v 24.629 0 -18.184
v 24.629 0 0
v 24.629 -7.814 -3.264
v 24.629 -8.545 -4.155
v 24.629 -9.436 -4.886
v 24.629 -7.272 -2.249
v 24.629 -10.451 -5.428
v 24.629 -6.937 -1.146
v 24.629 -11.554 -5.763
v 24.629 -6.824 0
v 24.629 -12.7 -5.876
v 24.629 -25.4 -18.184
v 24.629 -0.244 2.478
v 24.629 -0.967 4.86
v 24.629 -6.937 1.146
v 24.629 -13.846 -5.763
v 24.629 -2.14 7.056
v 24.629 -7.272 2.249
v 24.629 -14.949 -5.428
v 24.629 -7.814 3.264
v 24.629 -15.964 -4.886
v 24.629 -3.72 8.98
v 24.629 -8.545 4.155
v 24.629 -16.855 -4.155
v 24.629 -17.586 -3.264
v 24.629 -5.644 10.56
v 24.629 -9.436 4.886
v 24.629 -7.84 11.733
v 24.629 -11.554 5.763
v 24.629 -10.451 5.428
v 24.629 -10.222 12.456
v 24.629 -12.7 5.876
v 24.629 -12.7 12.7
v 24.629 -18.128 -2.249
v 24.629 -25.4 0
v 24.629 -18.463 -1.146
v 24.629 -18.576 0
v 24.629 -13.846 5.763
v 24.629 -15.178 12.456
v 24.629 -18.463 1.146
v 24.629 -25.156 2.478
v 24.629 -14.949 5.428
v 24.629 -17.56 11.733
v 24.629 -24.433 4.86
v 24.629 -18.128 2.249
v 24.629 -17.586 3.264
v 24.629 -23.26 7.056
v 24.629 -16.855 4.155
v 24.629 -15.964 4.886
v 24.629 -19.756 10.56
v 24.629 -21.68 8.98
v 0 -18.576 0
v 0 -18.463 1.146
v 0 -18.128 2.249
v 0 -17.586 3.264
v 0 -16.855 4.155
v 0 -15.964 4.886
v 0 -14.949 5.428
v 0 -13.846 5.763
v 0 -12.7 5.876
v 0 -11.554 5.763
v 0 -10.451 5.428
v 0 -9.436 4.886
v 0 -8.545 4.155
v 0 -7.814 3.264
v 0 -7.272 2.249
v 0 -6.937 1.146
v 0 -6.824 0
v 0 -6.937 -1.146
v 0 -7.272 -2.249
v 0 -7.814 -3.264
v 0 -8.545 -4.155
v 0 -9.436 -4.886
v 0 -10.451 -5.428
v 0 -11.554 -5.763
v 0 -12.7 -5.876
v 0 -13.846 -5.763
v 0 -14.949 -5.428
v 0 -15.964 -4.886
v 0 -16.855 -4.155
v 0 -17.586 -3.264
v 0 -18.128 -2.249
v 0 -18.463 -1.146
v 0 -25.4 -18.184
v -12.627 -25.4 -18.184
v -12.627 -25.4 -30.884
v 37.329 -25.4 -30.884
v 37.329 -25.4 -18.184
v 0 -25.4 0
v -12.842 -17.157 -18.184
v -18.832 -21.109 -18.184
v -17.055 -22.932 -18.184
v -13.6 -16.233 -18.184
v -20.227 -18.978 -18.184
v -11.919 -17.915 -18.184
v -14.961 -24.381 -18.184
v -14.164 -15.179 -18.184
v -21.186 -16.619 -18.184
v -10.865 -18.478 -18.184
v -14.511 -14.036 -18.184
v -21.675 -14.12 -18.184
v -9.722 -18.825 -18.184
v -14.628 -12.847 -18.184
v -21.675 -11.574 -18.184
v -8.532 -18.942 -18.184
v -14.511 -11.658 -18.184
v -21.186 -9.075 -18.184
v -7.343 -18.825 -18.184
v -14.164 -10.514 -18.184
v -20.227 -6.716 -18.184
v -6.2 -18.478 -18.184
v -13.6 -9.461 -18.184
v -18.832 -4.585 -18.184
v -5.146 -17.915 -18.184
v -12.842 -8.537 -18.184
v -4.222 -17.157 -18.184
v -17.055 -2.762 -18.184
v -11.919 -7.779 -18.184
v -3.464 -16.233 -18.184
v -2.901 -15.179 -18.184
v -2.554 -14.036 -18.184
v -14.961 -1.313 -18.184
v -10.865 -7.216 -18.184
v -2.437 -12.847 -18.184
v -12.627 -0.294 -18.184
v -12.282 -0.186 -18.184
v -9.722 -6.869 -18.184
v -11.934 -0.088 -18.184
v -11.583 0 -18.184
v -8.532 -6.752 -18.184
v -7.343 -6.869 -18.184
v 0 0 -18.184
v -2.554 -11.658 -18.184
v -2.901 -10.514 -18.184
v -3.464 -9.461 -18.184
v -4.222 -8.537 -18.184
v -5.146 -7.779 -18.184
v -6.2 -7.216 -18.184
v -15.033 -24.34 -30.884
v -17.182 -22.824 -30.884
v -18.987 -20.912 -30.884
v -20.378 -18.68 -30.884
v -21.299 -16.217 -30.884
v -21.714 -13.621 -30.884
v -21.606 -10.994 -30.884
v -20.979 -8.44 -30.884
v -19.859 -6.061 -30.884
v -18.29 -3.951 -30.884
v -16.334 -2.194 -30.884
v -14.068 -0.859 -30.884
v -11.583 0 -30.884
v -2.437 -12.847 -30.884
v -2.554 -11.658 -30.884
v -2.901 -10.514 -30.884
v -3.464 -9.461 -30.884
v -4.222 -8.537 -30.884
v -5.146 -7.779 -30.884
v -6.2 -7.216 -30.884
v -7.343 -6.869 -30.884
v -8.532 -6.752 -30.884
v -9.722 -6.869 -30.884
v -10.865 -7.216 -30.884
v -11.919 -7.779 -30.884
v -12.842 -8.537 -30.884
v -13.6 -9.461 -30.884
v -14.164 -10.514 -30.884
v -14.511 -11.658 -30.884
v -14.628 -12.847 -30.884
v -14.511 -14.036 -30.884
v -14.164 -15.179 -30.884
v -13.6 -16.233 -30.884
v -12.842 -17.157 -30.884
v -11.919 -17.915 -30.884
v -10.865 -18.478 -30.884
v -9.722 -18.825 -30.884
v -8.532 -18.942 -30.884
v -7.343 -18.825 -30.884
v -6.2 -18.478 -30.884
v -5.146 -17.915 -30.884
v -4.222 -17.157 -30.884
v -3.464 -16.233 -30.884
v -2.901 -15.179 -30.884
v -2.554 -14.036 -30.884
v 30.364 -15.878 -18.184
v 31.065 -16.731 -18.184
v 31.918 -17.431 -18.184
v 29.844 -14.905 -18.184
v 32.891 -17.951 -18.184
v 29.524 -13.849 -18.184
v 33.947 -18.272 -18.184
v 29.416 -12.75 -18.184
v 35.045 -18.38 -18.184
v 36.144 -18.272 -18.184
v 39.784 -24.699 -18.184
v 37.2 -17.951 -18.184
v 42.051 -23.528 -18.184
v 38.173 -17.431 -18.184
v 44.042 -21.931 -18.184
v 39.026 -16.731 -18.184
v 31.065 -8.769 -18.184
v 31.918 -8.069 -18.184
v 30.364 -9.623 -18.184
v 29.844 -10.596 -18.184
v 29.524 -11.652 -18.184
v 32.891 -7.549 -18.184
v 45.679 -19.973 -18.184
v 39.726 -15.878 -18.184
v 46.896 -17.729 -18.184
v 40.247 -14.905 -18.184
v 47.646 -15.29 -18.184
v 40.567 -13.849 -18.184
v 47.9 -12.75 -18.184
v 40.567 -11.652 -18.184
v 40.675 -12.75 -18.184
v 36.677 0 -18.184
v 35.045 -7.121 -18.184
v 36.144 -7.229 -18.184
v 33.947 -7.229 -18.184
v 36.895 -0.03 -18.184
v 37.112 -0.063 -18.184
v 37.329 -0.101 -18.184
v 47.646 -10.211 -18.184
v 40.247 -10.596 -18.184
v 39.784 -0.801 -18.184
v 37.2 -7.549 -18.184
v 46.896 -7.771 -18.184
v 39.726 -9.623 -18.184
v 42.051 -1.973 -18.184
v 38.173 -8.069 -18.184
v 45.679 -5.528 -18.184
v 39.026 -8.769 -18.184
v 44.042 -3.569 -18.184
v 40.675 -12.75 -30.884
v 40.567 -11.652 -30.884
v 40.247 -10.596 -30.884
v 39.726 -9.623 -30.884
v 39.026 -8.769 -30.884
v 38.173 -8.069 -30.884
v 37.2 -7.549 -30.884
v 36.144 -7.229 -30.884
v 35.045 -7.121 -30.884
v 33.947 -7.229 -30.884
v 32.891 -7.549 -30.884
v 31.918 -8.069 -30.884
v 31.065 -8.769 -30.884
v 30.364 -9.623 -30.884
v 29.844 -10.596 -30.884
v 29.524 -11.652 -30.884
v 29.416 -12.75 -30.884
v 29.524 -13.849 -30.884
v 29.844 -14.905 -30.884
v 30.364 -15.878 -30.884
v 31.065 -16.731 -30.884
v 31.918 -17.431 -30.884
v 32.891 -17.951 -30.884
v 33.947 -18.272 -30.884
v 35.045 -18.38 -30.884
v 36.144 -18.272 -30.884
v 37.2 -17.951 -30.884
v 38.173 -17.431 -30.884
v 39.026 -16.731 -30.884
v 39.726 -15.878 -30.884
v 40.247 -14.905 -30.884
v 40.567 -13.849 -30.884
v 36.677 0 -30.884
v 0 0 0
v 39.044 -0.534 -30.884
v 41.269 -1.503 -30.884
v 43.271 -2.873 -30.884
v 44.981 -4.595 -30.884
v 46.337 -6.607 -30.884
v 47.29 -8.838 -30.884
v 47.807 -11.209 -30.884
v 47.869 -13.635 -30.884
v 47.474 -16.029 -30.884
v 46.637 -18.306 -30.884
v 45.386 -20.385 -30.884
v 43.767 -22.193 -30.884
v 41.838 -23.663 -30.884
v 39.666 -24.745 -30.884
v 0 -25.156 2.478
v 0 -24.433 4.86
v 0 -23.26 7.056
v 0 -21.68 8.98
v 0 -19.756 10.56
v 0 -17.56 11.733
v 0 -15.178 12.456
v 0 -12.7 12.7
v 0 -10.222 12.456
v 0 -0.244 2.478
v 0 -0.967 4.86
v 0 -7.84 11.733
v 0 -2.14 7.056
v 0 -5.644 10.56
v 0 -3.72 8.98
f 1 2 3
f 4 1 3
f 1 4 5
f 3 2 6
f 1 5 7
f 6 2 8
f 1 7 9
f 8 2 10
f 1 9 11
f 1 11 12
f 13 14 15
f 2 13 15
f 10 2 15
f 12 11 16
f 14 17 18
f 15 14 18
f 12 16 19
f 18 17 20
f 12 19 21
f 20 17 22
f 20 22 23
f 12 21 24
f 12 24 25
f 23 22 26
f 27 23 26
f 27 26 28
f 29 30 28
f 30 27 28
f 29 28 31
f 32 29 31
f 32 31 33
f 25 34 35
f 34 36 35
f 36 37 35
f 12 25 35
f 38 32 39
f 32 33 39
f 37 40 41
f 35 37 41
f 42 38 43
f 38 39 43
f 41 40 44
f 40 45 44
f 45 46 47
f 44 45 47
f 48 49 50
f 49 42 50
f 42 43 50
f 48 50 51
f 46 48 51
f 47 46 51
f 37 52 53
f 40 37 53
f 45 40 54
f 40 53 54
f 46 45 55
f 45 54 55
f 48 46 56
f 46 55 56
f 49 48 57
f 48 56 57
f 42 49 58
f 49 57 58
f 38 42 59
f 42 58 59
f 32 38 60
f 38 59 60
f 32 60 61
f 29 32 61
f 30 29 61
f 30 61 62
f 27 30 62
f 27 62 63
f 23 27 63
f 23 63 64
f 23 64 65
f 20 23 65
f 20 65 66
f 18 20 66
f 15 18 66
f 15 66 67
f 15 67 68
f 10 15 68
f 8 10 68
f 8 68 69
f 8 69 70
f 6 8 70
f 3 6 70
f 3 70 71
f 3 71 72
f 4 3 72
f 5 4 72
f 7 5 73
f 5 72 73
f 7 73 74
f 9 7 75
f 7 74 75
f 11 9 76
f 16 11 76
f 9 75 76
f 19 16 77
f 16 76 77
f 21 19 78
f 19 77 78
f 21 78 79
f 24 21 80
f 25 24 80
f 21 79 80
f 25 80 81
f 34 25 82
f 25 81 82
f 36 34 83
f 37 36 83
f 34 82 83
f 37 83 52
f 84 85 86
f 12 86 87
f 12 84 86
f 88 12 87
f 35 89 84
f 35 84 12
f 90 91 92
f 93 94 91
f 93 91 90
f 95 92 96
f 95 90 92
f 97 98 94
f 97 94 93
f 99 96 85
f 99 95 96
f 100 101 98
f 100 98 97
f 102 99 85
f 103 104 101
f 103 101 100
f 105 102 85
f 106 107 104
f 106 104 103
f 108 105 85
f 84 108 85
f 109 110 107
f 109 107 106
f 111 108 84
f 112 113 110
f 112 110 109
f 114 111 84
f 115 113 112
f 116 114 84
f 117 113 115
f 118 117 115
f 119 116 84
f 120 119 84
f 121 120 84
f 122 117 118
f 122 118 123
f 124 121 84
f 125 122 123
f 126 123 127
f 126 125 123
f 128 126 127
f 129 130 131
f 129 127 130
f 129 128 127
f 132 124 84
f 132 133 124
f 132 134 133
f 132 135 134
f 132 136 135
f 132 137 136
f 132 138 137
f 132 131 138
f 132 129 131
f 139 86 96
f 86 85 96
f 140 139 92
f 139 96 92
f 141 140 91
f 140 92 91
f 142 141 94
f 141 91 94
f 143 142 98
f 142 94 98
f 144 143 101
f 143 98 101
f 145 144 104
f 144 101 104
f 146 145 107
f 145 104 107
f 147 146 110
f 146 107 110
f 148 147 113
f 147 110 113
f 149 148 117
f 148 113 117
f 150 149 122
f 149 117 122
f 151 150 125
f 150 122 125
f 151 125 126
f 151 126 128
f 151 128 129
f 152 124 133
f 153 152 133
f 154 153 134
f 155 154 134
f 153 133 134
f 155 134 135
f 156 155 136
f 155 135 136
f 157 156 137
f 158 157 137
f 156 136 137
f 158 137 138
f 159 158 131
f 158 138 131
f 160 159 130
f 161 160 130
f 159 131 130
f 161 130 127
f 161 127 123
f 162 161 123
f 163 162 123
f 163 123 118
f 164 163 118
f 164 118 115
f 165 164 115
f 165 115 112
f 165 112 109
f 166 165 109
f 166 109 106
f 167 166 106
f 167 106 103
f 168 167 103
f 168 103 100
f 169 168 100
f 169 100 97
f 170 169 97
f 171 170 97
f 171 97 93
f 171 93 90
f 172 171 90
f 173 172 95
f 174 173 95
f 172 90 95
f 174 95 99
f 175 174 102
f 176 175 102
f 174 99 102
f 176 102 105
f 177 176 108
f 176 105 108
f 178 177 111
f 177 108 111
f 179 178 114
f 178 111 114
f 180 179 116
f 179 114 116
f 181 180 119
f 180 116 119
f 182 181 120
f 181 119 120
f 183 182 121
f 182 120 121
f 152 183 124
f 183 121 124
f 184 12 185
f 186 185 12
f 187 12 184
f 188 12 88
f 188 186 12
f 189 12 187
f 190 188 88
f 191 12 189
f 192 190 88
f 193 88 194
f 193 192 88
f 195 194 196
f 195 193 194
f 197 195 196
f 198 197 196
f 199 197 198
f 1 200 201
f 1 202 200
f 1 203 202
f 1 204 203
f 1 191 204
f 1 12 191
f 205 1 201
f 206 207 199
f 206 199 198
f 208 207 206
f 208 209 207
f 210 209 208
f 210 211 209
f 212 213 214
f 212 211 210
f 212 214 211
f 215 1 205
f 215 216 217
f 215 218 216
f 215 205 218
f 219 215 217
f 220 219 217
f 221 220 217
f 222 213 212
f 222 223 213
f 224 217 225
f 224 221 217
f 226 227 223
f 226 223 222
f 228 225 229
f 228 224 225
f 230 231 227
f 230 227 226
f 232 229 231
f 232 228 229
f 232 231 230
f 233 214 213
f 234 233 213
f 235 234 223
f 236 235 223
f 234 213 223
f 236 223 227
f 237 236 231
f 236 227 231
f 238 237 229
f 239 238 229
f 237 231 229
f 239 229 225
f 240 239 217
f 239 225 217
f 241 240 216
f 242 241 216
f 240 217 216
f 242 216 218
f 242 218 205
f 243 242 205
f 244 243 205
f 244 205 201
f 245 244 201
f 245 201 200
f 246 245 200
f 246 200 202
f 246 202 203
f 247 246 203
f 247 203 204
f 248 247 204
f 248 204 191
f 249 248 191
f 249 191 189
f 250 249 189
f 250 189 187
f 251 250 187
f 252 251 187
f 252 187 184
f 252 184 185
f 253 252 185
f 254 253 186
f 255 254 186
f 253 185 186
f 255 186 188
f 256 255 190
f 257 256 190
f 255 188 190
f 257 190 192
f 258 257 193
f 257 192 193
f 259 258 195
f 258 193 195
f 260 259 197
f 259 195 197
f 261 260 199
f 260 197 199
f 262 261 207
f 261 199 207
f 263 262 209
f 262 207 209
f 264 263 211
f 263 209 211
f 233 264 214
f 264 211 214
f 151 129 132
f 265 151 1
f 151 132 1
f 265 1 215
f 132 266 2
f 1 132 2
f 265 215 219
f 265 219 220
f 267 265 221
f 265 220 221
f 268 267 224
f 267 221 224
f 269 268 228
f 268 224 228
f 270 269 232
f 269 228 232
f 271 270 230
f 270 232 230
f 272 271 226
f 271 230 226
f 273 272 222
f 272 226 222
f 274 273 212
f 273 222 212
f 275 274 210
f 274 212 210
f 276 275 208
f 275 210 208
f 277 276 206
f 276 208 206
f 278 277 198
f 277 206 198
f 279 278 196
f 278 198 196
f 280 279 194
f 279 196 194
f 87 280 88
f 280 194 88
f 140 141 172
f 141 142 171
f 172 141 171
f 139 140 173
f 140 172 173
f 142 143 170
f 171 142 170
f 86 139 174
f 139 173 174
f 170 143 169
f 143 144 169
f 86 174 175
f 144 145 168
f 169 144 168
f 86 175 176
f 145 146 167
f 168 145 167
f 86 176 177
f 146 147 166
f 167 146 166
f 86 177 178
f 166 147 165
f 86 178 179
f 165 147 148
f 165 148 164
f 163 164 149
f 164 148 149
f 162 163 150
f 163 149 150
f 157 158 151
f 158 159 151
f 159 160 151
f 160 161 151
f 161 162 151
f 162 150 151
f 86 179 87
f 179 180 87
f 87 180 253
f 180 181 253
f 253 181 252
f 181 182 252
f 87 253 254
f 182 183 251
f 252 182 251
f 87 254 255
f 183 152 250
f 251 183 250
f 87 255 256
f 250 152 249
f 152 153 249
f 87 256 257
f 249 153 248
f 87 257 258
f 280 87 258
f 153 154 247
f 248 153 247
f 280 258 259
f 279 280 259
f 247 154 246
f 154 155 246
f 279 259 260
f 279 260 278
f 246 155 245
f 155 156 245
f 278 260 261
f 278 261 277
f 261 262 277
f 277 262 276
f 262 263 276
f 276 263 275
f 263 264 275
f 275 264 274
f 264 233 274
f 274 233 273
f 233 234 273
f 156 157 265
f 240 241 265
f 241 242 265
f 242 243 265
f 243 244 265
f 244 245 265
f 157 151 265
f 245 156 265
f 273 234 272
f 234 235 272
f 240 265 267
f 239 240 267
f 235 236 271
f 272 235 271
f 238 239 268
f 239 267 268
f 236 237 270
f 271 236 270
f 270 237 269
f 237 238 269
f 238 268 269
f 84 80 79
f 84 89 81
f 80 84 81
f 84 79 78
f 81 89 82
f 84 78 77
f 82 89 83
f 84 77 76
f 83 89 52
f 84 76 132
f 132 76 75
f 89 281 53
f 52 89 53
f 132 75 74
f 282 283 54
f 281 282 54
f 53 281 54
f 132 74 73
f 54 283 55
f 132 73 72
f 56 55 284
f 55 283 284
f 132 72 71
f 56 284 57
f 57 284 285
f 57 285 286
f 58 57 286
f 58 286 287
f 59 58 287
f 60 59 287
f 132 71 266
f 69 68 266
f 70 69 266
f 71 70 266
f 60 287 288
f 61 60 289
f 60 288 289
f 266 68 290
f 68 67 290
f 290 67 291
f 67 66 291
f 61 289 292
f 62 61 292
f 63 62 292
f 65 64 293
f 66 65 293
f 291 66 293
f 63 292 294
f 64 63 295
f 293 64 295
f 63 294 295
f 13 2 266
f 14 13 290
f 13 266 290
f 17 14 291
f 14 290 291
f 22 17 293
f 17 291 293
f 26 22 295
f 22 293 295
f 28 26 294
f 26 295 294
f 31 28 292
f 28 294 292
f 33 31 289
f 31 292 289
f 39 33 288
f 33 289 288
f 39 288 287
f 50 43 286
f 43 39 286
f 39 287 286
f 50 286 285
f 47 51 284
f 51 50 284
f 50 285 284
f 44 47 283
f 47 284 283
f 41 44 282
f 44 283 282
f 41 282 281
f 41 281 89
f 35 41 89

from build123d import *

# Parameters (mm, degrees)
F0_W      = 69.85
F0_H      = 44.45
F1_DEPTH  = 25.4
F3_DEPTH  = 25.4
F4_DEPTH  = 25.4
F6_DEPTH  = 31.75
F7_R      = 6.0952761175
F8_DEPTH  = 25.4
F9_R      = 5.6297266716
F10_DEPTH = 25.4
F12_DEPTH = 25.4
F13_R     = 5.87576174
F14_DEPTH = 25.4


with BuildPart() as f1:
    # F0 (on Front) → F1 (new body)
    with BuildSketch(Plane.XZ):
        with Locations((13.0522018299, -8.6590135922)):
            Rectangle(F0_W, F0_H)
    extrude(amount=F1_DEPTH)

    # F2 (on face) → F3 (cut)
    with BuildSketch(Plane.XY.offset(13.5659864078)):
        with BuildLine():
            Line((-21.8727981701, -25.4), (-12.6271519341, -25.4))
            ThreePointArc((-12.6271519341, -25.4), (-21.7253869392, -12.3045156894), (-11.5829768121, 0))
            Line((-11.5829768121, 0), (-21.8727981701, 0))
            Line((-21.8727981701, 0), (-21.8727981701, -25.4))
        make_face()
        with BuildLine():
            ThreePointArc((36.6770463917, 0), (47.8953651974, -12.4202974309), (37.3292975128, -25.4))
            Line((37.3292975128, -25.4), (47.9772018299, -25.4))
            Line((47.9772018299, -25.4), (47.9772018299, 0))
            Line((47.9772018299, 0), (36.6770463917, 0))
        make_face()
    extrude(amount=-F3_DEPTH, mode=Mode.SUBTRACT)

    # F4 (cut): faces of the model
    f4_faces = [f1.faces().sort_by_distance(p)[0] for p in [
        (-21.7527689283, -12.3033900362, -11.8340135922),
        (47.923156279, -12.4195837788, -11.8340135922),
    ]]
    extrude(f4_faces, amount=-F4_DEPTH, mode=Mode.SUBTRACT)

    # F5 (on face) → F6 (cut)
    with BuildSketch(Plane.XY.offset(13.5659864078)):
        with BuildLine():
            ThreePointArc((-12.6271519341, -0.2937349935), (-21.7365300731, -12.8468674968), (-12.6271519341, -25.4))
            Line((-12.6271519341, -25.4), (-12.6271519341, -0.2937349935))
        make_face()
        with BuildLine():
            Line((-12.6271519341, -0.2937349935), (-12.6271519341, -25.4))
            Line((-12.6271519341, -25.4), (0, -25.4))
            Line((0, -25.4), (0, 0))
            Line((0, 0), (-11.5829768121, 0))
            ThreePointArc((-11.5829768121, 0), (-12.1080819056, -0.136140711), (-12.6271519341, -0.2937349935))
        make_face()
        with BuildLine():
            Line((24.6292975128, 0), (24.6292975128, -25.4))
            Line((24.6292975128, -25.4), (37.3292975128, -25.4))
            Line((37.3292975128, -25.4), (37.3292975128, -0.1005509322))
            ThreePointArc((37.3292975128, -0.1005509322), (37.0038173622, -0.046088838), (36.6770463917, 0))
            Line((36.6770463917, 0), (24.6292975128, 0))
        make_face()
        with BuildLine():
            Line((37.3292975128, -0.1005509322), (37.3292975128, -25.4))
            ThreePointArc((37.3292975128, -25.4), (47.8996012815, -12.7502754661), (37.3292975128, -0.1005509322))
        make_face()
    extrude(amount=-F6_DEPTH, mode=Mode.SUBTRACT)

    # F7 (on face) → F8 (cut)
    with BuildSketch(Plane.XY.offset(-18.1840135922)):
        with Locations((-8.5324506041, -12.8468674968)):
            Circle(F7_R)
    extrude(amount=-F8_DEPTH, mode=Mode.SUBTRACT)

    # F9 (on face) → F10 (cut)
    with BuildSketch(Plane.XY.offset(-18.1840135922)):
        with Locations((35.0453419106, -12.7502754661)):
            Circle(F9_R)
    extrude(amount=-F10_DEPTH, mode=Mode.SUBTRACT)

    # F11 (on face) → F12 (cut)
    with BuildSketch(Plane(origin=(0, 0, 0), x_dir=(0, -1, 0), z_dir=(-1, 0, 0))):
        with BuildLine():
            Line((0, 13.5659864078), (0, 0))
            ThreePointArc((0, 0), (12.7, 12.7), (25.4, 0))
            Line((25.4, 0), (25.4, 13.5659864078))
            Line((25.4, 13.5659864078), (0, 13.5659864078))
        make_face()
    extrude(amount=-F12_DEPTH, mode=Mode.SUBTRACT)

    # F13 (on face) → F14 (cut)
    with BuildSketch(Plane(origin=(0, 0, 0), x_dir=(0, -1, 0), z_dir=(-1, 0, 0))):
        with Locations((12.7, 0)):
            Circle(F13_R)
    extrude(amount=-F14_DEPTH, mode=Mode.SUBTRACT)


solid = f1.part
